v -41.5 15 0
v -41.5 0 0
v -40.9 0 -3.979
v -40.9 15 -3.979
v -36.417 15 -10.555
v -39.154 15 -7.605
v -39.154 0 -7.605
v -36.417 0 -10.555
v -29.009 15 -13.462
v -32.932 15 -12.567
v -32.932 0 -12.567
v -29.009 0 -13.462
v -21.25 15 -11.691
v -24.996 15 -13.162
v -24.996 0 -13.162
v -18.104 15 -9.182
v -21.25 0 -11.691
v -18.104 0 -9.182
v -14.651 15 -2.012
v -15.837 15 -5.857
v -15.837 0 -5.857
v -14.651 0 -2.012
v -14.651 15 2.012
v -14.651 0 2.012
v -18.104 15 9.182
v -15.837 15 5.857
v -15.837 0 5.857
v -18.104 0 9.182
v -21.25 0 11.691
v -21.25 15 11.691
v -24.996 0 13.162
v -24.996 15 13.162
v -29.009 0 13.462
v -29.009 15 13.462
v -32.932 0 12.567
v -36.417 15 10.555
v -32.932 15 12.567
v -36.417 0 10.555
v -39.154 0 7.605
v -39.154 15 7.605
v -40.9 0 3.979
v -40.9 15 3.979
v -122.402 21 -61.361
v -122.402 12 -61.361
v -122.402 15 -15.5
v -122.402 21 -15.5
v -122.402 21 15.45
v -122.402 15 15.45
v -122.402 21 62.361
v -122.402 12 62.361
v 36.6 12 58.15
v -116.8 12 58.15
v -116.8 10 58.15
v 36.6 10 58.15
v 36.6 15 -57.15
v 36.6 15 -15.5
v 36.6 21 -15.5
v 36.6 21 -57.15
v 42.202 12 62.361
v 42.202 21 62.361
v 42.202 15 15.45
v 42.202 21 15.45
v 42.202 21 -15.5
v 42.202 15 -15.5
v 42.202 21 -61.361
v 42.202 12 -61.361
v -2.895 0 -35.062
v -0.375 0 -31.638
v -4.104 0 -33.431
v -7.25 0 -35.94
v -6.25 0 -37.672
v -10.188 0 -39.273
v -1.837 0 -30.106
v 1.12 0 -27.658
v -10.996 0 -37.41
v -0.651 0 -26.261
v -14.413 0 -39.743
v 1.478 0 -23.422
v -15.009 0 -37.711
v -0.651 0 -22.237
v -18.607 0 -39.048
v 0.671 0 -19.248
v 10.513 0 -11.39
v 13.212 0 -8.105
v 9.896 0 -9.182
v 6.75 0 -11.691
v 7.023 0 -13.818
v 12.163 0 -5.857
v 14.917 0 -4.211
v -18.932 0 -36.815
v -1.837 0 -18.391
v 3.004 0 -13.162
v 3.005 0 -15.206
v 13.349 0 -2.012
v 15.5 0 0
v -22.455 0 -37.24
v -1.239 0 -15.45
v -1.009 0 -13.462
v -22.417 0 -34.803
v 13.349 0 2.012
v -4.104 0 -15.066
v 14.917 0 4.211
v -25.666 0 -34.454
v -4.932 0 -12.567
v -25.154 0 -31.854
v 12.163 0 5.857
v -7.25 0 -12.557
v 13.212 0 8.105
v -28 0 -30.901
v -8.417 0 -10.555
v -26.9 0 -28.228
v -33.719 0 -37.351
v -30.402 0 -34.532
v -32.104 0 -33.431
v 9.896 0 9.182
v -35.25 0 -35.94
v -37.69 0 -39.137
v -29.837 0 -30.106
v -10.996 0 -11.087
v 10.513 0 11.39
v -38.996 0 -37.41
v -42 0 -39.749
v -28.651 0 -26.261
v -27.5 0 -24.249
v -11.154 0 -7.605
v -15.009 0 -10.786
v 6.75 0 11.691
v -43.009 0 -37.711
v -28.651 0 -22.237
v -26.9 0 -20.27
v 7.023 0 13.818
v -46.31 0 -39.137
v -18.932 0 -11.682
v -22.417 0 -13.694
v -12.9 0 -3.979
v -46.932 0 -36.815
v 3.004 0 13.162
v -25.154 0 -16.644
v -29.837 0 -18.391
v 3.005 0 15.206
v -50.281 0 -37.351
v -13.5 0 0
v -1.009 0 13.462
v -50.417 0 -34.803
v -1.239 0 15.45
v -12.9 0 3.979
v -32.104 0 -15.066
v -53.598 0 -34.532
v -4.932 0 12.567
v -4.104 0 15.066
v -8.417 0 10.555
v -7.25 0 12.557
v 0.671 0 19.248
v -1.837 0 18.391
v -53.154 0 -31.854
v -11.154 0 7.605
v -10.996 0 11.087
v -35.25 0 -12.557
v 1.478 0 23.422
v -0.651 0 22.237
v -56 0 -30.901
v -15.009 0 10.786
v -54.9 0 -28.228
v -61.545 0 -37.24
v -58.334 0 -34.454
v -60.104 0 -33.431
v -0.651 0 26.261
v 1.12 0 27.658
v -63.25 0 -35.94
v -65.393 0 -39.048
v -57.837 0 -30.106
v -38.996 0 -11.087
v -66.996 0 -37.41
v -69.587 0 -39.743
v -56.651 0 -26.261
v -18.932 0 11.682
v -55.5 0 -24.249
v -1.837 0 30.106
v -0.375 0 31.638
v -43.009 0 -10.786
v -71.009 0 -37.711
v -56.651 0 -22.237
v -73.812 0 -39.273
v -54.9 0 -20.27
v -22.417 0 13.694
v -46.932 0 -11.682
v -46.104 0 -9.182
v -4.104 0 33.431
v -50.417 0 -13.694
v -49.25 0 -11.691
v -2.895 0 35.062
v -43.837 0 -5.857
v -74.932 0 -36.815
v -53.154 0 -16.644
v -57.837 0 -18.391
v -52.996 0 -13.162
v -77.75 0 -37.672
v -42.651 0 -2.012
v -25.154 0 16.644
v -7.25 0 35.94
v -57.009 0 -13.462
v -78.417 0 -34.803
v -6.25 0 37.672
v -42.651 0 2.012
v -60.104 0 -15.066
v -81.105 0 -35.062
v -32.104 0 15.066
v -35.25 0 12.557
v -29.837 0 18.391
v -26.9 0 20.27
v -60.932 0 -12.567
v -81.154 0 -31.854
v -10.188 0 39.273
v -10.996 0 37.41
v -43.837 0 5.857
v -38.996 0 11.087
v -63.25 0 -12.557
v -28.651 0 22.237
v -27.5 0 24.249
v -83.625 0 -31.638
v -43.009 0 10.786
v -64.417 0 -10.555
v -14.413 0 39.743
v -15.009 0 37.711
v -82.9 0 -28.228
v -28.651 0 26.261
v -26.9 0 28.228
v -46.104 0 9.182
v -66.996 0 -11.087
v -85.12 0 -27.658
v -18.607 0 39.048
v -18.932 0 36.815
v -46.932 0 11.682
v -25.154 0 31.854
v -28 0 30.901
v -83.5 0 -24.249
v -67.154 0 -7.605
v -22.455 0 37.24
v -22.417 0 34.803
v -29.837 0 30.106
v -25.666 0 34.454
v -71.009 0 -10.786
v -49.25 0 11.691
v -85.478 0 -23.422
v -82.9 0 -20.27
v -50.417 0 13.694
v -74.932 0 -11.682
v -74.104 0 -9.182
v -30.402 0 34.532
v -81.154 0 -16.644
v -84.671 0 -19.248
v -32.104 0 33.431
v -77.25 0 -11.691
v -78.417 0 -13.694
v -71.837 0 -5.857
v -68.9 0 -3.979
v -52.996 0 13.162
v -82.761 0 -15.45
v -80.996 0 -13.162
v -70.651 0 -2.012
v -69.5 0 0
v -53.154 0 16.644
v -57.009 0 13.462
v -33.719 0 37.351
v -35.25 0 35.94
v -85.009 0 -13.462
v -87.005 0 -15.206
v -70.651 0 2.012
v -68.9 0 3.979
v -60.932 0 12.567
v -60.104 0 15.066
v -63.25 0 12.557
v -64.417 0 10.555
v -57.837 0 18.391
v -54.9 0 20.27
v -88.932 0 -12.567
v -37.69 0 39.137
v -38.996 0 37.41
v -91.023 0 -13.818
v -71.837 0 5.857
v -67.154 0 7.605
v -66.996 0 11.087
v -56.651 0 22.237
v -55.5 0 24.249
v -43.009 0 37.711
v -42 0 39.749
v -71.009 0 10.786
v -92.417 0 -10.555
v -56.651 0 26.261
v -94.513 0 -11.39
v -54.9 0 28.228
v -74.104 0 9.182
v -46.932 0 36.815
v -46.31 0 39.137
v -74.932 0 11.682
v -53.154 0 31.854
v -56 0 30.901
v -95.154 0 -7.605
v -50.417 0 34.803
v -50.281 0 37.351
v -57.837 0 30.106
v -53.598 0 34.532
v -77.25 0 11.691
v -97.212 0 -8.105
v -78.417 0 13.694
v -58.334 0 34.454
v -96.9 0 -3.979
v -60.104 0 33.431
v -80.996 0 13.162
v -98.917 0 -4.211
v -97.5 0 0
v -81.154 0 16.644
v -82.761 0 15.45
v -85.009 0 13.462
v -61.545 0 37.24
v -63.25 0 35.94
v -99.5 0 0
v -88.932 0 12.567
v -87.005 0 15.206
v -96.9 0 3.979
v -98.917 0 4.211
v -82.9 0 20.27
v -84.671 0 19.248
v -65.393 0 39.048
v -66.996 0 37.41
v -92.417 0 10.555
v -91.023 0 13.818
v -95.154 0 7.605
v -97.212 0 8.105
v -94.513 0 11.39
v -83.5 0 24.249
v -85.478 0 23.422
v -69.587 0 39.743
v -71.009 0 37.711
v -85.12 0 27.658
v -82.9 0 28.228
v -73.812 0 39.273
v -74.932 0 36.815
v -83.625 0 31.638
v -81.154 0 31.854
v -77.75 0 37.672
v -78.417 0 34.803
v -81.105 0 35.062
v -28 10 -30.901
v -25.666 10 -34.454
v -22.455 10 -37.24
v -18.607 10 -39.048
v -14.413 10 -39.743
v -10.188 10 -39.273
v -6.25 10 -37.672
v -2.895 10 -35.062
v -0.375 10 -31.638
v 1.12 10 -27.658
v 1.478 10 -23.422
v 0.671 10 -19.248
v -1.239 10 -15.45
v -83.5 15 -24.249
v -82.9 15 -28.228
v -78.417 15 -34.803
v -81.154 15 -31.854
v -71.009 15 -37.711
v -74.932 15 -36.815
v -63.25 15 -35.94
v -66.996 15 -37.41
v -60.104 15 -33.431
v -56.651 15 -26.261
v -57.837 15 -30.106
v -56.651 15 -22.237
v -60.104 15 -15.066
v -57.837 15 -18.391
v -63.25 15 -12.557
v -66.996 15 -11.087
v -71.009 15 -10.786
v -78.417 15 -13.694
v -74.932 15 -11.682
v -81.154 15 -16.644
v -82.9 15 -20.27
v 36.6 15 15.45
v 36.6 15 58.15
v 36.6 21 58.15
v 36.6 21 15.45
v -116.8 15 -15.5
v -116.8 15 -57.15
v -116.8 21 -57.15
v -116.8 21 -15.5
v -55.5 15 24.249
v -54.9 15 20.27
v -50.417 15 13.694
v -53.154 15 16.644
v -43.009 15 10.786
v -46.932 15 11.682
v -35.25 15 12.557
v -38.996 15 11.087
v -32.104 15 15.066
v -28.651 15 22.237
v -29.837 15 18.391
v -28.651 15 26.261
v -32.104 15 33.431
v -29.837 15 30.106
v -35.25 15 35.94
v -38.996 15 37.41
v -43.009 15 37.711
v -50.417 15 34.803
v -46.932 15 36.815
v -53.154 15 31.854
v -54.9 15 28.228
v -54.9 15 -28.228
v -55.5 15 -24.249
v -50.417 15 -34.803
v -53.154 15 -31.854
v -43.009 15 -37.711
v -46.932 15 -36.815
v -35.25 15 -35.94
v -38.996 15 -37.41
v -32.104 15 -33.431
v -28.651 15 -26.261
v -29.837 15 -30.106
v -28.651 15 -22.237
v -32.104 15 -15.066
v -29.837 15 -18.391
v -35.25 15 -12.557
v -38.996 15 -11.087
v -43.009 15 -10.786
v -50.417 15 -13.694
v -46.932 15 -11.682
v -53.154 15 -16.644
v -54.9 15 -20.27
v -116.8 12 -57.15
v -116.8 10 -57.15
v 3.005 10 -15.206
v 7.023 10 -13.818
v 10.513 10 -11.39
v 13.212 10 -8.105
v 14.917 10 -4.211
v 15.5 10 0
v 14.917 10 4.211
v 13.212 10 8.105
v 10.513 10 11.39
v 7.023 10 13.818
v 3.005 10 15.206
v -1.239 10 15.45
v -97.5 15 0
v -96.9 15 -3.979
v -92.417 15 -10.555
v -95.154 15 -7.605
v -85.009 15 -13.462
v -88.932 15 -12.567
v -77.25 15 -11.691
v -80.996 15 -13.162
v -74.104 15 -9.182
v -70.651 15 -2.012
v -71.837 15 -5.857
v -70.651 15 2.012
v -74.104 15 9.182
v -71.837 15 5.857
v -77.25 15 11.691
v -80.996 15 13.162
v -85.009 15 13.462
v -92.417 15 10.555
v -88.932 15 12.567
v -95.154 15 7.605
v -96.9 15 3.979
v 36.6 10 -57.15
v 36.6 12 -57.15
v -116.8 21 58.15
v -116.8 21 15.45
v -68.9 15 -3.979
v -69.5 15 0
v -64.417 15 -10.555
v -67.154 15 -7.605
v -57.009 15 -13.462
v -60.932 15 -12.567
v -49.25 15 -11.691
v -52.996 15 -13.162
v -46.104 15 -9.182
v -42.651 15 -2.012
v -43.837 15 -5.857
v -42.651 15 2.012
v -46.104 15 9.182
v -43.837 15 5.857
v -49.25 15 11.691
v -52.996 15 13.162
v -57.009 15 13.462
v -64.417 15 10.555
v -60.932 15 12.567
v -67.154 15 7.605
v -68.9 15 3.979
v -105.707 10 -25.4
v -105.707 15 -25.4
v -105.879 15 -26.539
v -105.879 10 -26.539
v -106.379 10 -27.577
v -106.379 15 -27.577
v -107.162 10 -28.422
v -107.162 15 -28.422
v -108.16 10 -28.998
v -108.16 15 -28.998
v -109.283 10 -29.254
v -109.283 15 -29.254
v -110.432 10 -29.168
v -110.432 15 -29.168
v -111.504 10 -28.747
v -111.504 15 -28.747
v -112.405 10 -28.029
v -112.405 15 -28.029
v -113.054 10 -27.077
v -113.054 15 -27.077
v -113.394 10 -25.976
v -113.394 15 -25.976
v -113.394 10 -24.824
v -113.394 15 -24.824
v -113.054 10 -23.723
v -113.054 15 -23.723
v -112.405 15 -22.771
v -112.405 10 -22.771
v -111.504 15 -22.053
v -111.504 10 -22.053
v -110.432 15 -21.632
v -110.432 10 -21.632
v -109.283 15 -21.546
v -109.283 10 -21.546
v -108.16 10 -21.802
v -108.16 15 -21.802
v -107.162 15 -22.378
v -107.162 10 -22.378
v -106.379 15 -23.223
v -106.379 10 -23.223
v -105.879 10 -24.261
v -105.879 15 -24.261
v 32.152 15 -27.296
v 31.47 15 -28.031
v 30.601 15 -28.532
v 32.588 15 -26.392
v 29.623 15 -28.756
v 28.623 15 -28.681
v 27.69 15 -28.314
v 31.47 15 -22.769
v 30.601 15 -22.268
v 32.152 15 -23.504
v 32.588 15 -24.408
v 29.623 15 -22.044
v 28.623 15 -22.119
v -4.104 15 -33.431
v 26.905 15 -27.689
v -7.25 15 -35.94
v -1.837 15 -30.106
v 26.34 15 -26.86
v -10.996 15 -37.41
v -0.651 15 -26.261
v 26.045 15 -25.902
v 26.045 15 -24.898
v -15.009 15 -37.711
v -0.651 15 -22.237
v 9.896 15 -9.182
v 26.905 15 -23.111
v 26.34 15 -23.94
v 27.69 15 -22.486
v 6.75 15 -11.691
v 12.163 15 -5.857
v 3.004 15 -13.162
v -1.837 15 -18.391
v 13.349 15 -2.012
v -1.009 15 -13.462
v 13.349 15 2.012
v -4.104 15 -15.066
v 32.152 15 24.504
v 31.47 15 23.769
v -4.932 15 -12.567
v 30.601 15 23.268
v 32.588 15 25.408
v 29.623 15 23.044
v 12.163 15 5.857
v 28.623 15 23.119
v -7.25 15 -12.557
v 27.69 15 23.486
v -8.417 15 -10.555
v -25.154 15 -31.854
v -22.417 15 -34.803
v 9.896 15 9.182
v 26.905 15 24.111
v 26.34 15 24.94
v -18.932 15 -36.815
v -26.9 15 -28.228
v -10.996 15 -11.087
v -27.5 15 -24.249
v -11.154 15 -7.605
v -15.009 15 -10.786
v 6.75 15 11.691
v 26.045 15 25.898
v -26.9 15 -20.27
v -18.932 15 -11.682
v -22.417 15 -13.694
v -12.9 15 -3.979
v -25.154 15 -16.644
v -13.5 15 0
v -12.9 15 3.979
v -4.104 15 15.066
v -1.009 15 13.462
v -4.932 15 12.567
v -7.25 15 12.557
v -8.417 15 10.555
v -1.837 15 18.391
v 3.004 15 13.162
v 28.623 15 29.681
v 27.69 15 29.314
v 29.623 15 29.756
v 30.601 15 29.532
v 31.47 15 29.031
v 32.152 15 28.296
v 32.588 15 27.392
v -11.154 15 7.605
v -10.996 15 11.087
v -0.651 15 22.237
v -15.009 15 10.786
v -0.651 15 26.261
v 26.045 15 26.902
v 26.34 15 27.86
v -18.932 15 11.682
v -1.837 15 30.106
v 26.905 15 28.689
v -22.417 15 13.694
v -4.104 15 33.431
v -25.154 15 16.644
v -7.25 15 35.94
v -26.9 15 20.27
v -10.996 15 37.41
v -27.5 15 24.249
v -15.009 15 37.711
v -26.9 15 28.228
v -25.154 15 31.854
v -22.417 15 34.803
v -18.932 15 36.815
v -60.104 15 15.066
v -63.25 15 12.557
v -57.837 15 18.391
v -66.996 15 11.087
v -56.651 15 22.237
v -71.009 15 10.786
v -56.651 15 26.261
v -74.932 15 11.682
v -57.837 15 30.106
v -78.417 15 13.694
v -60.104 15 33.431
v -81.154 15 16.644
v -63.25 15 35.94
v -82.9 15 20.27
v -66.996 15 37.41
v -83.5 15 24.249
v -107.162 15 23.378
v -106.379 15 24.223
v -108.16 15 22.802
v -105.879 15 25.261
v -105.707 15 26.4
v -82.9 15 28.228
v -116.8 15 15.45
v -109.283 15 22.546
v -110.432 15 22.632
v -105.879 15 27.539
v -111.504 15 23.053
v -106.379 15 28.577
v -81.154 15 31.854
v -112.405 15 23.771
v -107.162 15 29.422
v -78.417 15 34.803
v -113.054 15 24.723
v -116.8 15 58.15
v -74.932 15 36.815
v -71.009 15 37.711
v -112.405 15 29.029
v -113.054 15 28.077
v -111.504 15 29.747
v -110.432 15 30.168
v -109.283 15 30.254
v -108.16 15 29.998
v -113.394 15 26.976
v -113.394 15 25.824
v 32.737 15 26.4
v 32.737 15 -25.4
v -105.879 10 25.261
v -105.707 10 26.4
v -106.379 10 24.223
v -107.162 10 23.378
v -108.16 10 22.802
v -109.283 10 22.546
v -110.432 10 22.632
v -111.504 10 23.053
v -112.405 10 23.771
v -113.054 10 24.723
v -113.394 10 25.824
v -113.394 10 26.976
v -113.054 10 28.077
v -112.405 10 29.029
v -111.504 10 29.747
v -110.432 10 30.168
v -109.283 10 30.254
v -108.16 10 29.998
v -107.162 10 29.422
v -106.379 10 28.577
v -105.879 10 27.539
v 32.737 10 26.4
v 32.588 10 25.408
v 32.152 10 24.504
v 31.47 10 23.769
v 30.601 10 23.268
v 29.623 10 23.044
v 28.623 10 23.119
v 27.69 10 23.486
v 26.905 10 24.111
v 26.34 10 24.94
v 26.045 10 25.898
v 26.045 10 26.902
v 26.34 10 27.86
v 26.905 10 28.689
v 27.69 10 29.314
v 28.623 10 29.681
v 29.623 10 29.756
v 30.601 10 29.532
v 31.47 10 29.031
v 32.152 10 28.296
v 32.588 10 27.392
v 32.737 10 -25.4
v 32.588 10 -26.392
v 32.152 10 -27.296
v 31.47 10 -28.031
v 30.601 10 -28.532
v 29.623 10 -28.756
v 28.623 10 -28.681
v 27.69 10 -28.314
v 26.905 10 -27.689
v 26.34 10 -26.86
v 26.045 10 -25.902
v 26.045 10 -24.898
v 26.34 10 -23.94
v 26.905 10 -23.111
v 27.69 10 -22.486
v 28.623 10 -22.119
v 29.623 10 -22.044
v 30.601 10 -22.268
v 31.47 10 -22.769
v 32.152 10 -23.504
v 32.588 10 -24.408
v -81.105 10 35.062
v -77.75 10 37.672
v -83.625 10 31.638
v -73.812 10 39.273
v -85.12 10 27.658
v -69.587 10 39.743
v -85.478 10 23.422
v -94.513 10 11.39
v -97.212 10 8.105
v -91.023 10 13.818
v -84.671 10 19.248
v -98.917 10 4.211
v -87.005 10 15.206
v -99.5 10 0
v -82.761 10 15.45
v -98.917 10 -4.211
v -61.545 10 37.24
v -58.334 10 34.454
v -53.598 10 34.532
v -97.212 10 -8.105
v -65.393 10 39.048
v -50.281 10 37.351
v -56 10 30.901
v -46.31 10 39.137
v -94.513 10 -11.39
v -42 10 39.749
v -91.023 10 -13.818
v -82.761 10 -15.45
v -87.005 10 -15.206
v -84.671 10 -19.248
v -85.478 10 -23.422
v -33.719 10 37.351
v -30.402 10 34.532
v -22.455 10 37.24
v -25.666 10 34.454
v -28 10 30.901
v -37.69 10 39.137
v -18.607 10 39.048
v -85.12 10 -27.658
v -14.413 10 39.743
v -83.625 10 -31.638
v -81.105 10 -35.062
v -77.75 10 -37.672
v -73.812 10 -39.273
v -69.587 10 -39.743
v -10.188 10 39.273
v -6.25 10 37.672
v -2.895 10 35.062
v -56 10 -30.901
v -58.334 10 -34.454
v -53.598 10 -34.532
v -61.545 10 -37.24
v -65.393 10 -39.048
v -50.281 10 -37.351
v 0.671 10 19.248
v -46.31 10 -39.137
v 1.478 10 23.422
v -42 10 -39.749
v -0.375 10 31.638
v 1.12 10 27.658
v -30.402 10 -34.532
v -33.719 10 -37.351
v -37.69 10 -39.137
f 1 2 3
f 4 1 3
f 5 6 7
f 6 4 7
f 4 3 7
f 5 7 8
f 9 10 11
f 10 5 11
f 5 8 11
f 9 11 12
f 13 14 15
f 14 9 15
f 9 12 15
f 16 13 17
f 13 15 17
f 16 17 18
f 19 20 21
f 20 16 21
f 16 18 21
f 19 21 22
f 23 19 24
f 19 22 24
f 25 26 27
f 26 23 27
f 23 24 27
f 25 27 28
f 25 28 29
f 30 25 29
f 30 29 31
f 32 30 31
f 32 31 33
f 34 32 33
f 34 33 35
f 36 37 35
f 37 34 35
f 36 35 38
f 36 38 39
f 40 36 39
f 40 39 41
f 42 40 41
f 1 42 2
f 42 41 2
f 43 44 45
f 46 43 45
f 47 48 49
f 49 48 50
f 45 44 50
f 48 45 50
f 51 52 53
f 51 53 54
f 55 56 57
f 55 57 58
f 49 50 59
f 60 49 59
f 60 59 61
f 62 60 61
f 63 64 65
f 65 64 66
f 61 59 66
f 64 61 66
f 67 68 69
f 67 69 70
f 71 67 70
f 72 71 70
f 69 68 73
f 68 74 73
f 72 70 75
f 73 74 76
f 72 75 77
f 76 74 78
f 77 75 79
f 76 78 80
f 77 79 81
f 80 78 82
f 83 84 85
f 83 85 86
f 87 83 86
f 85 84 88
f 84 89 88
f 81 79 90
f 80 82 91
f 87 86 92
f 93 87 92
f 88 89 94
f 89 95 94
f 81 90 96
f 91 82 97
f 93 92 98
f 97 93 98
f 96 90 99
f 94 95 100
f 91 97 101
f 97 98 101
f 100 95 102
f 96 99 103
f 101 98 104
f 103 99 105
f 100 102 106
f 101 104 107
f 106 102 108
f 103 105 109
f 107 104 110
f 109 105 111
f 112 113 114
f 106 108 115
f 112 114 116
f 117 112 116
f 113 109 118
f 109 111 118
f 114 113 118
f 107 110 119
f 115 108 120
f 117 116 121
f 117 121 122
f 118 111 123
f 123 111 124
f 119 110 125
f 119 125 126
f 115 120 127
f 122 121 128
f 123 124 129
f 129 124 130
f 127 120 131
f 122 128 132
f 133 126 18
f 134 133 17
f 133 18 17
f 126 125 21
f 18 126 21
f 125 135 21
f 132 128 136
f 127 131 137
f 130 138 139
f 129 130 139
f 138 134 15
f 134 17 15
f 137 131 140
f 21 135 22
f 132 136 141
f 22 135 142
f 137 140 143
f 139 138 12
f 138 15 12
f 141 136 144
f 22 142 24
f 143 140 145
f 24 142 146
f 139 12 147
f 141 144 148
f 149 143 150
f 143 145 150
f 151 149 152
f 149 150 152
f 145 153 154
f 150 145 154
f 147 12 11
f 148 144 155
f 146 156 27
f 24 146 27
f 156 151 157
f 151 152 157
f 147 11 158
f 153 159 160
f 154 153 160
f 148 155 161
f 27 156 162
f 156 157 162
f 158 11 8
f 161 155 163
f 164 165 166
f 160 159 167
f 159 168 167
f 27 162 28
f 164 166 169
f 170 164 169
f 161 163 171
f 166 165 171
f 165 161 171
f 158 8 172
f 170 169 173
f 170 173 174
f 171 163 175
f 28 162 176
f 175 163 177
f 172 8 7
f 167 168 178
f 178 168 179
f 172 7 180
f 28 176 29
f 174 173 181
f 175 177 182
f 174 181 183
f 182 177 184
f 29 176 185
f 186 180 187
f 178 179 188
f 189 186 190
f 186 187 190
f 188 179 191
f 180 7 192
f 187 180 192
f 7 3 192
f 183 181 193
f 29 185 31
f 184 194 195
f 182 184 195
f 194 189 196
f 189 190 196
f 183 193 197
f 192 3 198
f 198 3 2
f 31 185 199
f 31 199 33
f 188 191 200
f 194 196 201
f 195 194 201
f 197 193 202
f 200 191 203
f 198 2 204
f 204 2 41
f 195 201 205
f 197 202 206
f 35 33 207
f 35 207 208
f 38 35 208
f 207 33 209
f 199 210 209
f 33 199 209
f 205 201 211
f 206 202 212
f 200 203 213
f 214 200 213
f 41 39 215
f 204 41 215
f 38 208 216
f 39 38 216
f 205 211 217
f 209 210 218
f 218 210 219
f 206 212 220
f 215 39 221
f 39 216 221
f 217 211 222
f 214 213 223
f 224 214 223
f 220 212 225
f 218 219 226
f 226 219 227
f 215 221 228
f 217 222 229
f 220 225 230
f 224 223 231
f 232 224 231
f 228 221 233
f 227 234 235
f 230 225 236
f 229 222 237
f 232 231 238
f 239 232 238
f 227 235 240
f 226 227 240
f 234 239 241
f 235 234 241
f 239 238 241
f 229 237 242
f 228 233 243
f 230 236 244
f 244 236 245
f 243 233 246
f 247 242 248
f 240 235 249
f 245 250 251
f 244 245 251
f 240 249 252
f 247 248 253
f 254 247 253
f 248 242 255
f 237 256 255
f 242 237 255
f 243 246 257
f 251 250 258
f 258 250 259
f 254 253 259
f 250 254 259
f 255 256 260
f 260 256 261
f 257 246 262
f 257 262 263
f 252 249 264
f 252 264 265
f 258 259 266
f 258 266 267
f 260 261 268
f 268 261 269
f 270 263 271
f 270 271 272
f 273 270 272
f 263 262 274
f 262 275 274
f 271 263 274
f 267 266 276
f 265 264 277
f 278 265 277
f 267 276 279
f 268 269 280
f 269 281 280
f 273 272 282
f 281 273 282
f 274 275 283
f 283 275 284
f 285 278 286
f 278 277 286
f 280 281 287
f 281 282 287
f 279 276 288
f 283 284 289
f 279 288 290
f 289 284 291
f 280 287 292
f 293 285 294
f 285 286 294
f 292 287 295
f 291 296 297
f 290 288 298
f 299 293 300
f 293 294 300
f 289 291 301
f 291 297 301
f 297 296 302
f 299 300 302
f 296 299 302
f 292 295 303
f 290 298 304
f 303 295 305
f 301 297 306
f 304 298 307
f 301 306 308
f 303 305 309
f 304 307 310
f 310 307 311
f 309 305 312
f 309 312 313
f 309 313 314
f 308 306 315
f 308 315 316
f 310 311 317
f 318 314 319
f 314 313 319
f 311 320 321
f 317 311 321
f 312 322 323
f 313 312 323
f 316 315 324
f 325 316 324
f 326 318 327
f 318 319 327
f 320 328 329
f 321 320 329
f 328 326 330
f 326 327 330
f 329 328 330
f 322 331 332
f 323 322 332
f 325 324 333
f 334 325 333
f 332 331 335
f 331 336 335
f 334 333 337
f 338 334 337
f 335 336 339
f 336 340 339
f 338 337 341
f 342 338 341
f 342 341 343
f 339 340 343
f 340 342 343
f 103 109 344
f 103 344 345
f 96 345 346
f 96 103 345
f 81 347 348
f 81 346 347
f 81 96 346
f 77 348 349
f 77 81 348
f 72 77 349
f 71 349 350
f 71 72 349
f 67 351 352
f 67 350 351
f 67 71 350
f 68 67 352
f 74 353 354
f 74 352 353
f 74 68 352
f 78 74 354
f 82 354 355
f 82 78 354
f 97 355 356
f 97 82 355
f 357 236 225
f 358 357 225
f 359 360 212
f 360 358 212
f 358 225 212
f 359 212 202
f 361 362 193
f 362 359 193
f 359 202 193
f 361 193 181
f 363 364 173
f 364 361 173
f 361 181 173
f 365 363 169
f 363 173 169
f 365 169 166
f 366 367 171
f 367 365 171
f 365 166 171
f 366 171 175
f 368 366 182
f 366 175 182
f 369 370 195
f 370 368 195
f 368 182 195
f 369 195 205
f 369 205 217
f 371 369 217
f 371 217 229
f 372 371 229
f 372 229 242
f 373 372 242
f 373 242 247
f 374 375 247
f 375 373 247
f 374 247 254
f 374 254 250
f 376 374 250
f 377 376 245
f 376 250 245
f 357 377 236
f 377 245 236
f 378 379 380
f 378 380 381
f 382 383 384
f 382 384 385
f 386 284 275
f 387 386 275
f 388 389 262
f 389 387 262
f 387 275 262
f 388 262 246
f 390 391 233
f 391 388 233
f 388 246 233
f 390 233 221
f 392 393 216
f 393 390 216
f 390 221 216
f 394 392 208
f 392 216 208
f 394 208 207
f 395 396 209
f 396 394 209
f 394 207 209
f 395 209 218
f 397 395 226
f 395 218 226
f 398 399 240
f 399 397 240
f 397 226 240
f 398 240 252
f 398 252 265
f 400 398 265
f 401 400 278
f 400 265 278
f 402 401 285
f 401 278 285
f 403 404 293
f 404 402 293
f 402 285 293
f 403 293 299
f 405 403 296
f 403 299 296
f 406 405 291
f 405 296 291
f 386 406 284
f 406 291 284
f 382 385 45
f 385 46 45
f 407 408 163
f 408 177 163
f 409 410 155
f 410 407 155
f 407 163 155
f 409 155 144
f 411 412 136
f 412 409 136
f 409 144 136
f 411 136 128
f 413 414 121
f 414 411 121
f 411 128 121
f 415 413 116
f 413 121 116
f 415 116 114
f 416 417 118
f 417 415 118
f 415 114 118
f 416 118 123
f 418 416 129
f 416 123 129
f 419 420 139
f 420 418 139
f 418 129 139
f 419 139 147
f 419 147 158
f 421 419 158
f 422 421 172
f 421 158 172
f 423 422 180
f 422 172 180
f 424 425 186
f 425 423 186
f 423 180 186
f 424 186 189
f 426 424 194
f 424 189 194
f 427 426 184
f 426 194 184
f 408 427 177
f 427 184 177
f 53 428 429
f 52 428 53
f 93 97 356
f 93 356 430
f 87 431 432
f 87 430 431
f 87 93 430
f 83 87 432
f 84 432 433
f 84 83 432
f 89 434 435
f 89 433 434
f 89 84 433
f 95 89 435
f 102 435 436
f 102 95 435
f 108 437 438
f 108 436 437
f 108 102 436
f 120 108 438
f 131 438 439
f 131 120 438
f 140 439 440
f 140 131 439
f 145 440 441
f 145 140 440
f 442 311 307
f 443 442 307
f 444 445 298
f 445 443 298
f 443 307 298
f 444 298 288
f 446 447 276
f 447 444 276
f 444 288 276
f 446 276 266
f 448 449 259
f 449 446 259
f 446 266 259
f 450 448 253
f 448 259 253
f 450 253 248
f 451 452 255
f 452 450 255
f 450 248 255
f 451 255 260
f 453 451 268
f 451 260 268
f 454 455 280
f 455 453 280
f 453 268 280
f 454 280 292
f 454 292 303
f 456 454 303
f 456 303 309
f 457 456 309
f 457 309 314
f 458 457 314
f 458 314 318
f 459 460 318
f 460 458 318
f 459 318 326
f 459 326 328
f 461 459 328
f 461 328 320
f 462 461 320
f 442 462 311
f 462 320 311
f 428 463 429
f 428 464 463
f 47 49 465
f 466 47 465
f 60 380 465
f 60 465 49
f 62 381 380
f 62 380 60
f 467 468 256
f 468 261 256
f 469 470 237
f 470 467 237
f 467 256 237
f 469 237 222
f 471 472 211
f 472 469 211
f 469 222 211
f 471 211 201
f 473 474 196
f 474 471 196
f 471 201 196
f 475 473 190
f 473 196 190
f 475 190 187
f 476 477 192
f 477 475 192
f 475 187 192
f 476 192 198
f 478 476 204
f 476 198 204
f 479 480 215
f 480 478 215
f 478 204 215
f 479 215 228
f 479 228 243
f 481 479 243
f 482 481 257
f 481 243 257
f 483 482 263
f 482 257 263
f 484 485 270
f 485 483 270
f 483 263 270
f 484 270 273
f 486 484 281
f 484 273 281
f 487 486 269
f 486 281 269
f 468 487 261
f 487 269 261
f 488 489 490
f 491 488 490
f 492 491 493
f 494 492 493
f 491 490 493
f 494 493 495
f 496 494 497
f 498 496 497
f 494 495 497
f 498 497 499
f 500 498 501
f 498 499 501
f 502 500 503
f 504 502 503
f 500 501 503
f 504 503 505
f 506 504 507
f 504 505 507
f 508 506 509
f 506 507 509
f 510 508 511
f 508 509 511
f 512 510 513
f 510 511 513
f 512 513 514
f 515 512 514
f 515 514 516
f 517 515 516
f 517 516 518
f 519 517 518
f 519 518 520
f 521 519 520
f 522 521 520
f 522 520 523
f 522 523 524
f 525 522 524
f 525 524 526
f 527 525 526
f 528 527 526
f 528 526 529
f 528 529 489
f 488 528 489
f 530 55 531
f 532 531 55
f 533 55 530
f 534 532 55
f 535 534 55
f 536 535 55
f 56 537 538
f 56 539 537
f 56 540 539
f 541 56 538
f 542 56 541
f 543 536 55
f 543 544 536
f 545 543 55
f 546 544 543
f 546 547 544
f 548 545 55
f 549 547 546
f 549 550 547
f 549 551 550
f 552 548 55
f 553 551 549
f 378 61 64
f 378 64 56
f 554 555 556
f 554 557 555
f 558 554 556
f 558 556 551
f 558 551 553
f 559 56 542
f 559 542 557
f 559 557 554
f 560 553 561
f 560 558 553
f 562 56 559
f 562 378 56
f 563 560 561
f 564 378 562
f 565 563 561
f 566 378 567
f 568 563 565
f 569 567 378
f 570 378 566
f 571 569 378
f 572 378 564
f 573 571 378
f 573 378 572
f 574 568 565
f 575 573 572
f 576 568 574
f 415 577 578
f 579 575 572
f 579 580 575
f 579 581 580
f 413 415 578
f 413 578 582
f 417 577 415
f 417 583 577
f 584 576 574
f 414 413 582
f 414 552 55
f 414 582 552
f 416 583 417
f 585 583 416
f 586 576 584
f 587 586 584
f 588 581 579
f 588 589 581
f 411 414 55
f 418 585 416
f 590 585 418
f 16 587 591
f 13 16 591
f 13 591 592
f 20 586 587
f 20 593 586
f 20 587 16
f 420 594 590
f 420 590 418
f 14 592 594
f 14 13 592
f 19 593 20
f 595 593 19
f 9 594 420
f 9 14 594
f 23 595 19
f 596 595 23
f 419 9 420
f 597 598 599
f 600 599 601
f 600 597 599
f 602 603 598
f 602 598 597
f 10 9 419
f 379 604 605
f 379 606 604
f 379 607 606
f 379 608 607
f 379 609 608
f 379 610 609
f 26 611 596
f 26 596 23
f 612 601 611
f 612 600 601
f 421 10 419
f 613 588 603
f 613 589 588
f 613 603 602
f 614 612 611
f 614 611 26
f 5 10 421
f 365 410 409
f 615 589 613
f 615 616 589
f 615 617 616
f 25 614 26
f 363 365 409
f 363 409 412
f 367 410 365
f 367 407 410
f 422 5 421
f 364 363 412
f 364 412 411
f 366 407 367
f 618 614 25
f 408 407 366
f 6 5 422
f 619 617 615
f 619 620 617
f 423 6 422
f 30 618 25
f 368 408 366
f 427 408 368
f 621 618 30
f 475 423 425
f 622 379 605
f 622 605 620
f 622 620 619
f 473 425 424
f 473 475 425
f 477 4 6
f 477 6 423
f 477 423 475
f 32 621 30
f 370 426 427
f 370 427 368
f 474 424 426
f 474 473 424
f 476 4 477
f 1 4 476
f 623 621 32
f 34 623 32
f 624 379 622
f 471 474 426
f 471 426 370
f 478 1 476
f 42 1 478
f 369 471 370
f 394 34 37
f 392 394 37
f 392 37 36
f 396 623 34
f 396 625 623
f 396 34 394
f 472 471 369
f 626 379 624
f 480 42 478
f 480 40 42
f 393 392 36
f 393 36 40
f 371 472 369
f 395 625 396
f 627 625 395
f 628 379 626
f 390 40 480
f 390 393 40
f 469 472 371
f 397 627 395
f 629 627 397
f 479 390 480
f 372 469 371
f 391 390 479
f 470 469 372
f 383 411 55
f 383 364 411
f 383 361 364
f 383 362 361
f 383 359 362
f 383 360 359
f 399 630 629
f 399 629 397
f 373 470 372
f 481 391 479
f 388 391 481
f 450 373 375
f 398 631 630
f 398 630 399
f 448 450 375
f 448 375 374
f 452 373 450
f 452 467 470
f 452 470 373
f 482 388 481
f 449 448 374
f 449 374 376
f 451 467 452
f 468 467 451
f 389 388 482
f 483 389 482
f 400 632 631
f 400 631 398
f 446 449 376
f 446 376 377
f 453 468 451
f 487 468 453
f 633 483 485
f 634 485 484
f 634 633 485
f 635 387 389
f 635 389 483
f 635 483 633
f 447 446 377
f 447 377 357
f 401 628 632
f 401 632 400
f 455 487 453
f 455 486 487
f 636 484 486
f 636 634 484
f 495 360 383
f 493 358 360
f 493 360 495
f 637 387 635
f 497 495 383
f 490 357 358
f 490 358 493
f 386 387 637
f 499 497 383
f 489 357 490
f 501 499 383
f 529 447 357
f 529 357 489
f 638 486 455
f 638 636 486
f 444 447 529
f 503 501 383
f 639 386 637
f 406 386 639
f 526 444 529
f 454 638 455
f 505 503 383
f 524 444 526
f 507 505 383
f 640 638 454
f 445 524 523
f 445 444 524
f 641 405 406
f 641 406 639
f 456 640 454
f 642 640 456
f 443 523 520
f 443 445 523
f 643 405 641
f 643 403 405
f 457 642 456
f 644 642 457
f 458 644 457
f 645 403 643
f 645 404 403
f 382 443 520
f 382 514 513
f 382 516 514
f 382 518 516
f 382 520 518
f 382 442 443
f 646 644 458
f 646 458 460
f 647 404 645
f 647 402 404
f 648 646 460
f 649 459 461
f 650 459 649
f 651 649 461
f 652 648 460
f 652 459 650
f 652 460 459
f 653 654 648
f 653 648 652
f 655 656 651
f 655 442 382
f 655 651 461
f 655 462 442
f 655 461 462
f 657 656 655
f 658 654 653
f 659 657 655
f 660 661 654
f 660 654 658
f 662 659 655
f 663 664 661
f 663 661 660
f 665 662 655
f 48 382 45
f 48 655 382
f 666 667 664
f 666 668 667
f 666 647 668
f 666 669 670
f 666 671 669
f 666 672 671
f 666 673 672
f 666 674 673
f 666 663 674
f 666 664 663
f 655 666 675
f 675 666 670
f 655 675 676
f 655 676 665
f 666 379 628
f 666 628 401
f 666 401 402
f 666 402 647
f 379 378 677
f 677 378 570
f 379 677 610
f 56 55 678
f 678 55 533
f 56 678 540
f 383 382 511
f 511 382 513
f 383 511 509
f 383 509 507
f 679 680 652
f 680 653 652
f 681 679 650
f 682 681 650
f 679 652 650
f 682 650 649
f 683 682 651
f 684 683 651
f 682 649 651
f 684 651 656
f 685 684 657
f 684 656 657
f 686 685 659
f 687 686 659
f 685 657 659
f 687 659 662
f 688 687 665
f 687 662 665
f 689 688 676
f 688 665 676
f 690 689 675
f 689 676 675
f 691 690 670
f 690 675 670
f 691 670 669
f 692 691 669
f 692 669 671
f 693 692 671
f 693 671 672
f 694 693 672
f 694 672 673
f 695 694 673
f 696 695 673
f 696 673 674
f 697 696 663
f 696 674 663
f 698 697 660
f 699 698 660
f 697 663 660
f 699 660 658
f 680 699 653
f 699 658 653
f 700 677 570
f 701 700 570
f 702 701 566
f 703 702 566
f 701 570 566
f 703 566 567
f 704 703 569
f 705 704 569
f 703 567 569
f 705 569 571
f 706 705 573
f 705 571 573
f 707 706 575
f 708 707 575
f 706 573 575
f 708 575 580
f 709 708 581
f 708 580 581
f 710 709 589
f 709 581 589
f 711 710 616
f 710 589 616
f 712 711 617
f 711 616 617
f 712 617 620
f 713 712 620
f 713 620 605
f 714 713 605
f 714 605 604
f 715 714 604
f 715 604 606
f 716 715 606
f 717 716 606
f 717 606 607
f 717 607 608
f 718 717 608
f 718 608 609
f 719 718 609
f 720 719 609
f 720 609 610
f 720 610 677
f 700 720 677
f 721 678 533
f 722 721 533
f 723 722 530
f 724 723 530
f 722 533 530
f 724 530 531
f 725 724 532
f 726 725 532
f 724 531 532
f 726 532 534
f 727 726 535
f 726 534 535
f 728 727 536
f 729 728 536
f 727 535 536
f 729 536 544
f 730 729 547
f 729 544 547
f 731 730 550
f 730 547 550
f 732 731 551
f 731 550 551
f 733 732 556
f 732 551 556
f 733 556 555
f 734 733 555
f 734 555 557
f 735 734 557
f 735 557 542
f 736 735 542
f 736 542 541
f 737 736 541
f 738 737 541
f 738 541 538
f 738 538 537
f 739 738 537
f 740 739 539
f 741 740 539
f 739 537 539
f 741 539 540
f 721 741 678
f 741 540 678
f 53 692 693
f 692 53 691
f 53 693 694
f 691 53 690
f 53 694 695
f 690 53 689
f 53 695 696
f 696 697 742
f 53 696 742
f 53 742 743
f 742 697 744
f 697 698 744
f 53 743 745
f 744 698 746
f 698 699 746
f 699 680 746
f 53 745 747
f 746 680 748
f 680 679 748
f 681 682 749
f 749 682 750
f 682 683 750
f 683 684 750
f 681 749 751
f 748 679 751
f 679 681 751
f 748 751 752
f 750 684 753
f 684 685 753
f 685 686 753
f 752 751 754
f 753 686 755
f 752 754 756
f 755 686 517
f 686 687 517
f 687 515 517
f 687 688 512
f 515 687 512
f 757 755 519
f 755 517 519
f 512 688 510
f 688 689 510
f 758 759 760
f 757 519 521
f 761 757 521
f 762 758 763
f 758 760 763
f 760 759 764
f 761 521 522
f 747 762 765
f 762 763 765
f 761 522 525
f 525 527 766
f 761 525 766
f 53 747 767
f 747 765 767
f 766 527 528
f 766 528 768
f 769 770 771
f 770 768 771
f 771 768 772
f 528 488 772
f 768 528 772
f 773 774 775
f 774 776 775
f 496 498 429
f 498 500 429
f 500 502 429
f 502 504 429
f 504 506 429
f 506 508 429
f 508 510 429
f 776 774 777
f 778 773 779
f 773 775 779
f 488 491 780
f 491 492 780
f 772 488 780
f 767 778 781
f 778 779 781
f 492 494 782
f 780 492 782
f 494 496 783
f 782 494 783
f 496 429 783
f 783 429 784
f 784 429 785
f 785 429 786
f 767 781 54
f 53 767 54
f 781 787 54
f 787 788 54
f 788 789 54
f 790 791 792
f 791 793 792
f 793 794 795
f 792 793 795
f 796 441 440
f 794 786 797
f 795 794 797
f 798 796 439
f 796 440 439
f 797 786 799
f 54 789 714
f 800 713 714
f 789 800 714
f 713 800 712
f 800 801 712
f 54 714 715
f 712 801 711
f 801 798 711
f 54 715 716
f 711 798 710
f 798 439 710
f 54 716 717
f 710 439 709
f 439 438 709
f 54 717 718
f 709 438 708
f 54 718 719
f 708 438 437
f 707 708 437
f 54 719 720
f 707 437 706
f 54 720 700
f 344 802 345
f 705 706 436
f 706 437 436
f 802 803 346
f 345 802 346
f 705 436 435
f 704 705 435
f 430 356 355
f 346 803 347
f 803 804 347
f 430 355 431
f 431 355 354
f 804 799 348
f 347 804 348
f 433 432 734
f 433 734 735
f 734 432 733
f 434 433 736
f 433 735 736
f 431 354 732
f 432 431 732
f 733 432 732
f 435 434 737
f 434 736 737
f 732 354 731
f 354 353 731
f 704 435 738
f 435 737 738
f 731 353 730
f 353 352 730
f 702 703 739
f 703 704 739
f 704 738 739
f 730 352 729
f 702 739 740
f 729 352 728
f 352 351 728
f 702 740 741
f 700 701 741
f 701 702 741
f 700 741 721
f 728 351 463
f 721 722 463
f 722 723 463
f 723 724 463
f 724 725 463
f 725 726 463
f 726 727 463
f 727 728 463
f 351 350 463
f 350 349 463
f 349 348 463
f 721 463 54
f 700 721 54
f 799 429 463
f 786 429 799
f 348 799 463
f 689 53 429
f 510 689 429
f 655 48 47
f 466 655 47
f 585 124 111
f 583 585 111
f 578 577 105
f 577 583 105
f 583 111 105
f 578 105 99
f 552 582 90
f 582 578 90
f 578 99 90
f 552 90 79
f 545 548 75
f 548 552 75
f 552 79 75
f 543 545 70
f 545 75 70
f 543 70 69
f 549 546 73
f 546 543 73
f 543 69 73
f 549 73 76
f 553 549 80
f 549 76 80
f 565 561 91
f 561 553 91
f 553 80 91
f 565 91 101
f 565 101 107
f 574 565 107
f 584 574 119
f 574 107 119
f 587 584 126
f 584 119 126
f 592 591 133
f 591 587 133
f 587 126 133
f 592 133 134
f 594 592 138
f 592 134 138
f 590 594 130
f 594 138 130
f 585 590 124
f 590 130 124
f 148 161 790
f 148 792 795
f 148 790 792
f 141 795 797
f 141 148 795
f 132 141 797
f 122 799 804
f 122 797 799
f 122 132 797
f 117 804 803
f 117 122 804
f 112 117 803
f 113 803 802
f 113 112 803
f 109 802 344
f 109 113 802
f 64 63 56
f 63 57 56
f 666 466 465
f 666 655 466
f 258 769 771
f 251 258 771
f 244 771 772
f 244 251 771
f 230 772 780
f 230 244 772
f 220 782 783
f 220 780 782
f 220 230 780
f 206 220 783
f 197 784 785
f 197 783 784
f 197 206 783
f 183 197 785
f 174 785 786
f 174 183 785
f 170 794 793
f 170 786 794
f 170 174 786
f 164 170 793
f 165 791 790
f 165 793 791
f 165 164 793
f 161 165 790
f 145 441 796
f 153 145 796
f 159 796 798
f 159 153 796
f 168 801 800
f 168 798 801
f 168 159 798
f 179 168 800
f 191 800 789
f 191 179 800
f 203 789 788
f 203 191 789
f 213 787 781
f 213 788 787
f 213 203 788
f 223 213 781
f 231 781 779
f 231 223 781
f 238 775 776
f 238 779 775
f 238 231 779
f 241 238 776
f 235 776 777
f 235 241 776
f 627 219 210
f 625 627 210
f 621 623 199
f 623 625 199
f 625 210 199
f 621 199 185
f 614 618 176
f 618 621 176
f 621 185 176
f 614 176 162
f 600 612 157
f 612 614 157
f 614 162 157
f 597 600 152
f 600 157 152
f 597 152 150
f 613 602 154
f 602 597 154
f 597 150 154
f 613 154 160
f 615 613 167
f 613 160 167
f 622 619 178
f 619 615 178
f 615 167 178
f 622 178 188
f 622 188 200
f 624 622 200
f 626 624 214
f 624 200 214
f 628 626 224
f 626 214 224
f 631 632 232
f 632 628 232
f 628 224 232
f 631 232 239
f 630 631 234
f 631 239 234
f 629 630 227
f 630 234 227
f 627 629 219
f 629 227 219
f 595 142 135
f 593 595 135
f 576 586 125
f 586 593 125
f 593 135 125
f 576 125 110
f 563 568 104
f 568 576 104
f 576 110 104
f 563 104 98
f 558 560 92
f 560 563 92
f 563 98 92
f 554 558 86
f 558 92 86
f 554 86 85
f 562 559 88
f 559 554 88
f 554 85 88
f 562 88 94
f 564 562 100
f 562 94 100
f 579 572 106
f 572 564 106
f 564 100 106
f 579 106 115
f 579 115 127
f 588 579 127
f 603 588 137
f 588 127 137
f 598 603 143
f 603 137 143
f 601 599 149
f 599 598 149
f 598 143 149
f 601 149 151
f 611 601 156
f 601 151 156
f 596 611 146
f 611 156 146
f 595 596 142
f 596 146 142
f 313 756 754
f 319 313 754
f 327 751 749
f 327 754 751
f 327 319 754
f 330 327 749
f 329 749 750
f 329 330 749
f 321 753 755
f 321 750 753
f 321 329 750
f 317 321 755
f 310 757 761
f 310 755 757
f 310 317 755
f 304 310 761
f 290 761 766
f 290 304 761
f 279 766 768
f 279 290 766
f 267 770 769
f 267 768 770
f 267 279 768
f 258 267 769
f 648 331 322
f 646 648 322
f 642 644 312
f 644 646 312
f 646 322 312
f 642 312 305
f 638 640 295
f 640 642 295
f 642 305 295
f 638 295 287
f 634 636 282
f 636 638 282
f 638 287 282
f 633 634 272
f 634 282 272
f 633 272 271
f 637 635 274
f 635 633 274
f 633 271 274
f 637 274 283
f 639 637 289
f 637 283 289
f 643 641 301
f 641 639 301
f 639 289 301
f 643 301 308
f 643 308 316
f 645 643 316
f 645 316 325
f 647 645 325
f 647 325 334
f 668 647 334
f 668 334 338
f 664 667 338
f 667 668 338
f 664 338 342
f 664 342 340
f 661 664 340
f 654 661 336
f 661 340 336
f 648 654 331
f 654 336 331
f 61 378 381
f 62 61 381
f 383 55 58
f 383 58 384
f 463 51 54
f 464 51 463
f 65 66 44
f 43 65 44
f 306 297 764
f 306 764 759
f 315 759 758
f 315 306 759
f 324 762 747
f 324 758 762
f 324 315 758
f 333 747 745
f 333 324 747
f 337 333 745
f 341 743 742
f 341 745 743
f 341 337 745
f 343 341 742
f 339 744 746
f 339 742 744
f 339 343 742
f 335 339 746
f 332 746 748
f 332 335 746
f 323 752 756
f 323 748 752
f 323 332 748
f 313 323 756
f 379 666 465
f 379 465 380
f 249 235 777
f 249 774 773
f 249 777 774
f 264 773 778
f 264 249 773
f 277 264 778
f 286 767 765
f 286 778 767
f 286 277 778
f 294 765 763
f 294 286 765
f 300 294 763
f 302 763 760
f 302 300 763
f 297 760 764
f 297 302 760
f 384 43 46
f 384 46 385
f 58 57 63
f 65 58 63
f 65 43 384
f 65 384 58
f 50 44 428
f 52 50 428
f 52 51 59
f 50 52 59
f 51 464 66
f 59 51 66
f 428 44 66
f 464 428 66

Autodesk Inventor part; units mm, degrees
ref_plane "YZ Plane" through (0, 0, 0) normal (1, 0, 0) x (0, 1, 0)
ref_plane "XZ Plane" through (0, 0, 0) normal (0, 1, 0) x (-1, 0, 0)
ref_plane "XY Plane" through (0, 0, 0) normal (0, 0, 1) x (1, 0, 0)
sketch "Sketch1" plane through (0, 0, 0) normal (0, 1, 0) x (-1, 0, 0)
  circle A0 centre (0, 0) radius 13.5
  circle A1 centre (0, 0) radius 14.5 construction
  circle A2 centre (28, 0) radius 13.5
  circle A3 centre (28, 0) radius 14.5 construction
  circle A4 centre (56, 0) radius 13.5
  circle A5 centre (56, 0) radius 14.5 construction
  circle A6 centre (84, 0) radius 13.5
  circle A7 centre (84, 0) radius 14.5 construction
  circle A8 centre (14, 24.2487) radius 13.5
  circle A9 centre (42, 24.2487) radius 13.5
  circle A10 centre (70, 24.2487) radius 13.5
  circle A11 centre (70, -24.2487) radius 13.5
  circle A12 centre (42, -24.2487) radius 13.5
  circle A13 centre (14, -24.2487) radius 13.5
  line L0 (84, 0) -> (56, 0) construction
  circle A14 centre (14, 24.2487) radius 14.5 construction
  circle A15 centre (42, 24.2487) radius 14.5 construction
  circle A16 centre (70, 24.2487) radius 14.5 construction
  circle A17 centre (70, -24.2487) radius 14.5 construction
  circle A18 centre (42, -24.2487) radius 14.5 construction
  circle A19 centre (14, -24.2487) radius 14.5 construction
  circle A20 centre (0, 0) radius 15.5 construction
  circle A21 centre (14, 24.2487) radius 15.5 construction
  circle A22 centre (42, 24.2487) radius 15.5 construction
  circle A23 centre (70, 24.2487) radius 15.5 construction
  circle A24 centre (70, -24.2487) radius 15.5 construction
  circle A25 centre (42, -24.2487) radius 15.5 construction
  circle A26 centre (14, -24.2487) radius 15.5 construction
  arc A27 (1.2391, 15.4504) -> (1.2391, -15.4504) centre (0, 0) ccw
  arc A28 (28, 30.9008) -> (1.2391, 15.4504) centre (14, 24.2487) ccw
  arc A29 (56, 30.9008) -> (28, 30.9008) centre (42, 24.2487) ccw
  line L1 (70, 24.2487) -> (14, 24.2487) construction
  line L2 (14, 24.2487) -> (14, -24.2487) construction
  line L3 (14, -24.2487) -> (70, -24.2487) construction
  line L4 (70, -24.2487) -> (70, 24.2487) construction
  circle A30 centre (84, 0) radius 15.5 construction
  arc A31 (82.7609, 15.4504) -> (56, 30.9008) centre (70, 24.2487) ccw
  arc A32 (82.7609, -15.4504) -> (82.7609, 15.4504) centre (84, 0) ccw
  arc A33 (56, -30.9008) -> (82.7609, -15.4504) centre (70, -24.2487) ccw
  arc A34 (28, -30.9008) -> (56, -30.9008) centre (42, -24.2487) ccw
  arc A35 (1.2391, -15.4504) -> (28, -30.9008) centre (14, -24.2487) ccw
  dimension "d0" = 27
  dimension "d1" = 29
  dimension "d2" = 27
  dimension "d3" = 29
  dimension "d4" = 27
  dimension "d5" = 29
  dimension "d6" = 27
  dimension "d7" = 29
  dimension "d8" = 27
  dimension "d9" = 27
  dimension "d10" = 27
  dimension "d11" = 27
  dimension "d12" = 27
  dimension "d13" = 27
  dimension "d14" = 29
  dimension "d15" = 29
  dimension "d16" = 29
  dimension "d17" = 29
  dimension "d18" = 29
  dimension "d19" = 29
  dimension "d20" = 31
  dimension "d21" = 31
  dimension "d22" = 31
  dimension "d23" = 31
  dimension "d24" = 31
  dimension "d25" = 31
  dimension "d26" = 31
  dimension "d27" = 31
extrude "Extrusion1" add sketch "Sketch1" along normal blind 15
sketch "Sketch2" plane through (0, 15, 0) normal (0, 1, 0) x (1, 0, 0)
  arc A0 (-1.2391, 15.4504) -> (-28, 30.9008) centre (-14, 24.2487) ccw projected
  arc A1 (-28, 30.9008) -> (-56, 30.9008) centre (-42, 24.2487) ccw projected
  arc A2 (-56, 30.9008) -> (-82.7609, 15.4504) centre (-70, 24.2487) ccw projected
  arc A3 (-82.7609, 15.4504) -> (-82.7609, -15.4504) centre (-84, 0) ccw projected
  arc A4 (-82.7609, -15.4504) -> (-56, -30.9008) centre (-70, -24.2487) ccw projected
  arc A5 (-56, -30.9008) -> (-28, -30.9008) centre (-42, -24.2487) ccw projected
  arc A6 (-28, -30.9008) -> (-1.2391, -15.4504) centre (-14, -24.2487) ccw projected
  arc A7 (-1.2391, -15.4504) -> (-1.2391, 15.4504) centre (0, 0) ccw projected
  circle A8 centre (-14, 24.2487) radius 13.5 projected
  circle A9 centre (-42, 24.2487) radius 13.5 projected
  circle A10 centre (-70, 24.2487) radius 13.5 projected
  circle A11 centre (-70, -24.2487) radius 13.5 projected
  circle A12 centre (-42, -24.2487) radius 13.5 projected
  circle A13 centre (-14, -24.2487) radius 13.5 projected
  circle A14 centre (-84, 0) radius 13.5 projected
  circle A15 centre (-56, 0) radius 13.5 projected
  circle A16 centre (-28, 0) radius 13.5 projected
  circle A17 centre (0, 0) radius 13.5 projected
  line L0 (-116.8, -58.15) -> (36.6, -58.15)
  line L1 (36.6, -58.15) -> (36.6, 57.15)
  line L2 (36.6, 57.15) -> (-116.8, 57.15)
  line L3 (-116.8, 57.15) -> (-116.8, -58.15)
  line L4 (-116.8, -58.15) -> (36.6, 57.15) construction
  line L5 (36.6, -58.15) -> (-116.8, 57.15) construction
  arc A18 (-82.7609, 15.4504) -> (-82.7609, -15.4504) centre (-84, 0) ccw
  arc A19 (-56, 30.9008) -> (-82.7609, 15.4504) centre (-70, 24.2487) ccw
  arc A20 (-28, 30.9008) -> (-56, 30.9008) centre (-42, 24.2487) ccw
  arc A21 (-1.2391, 15.4504) -> (-28, 30.9008) centre (-14, 24.2487) ccw
  arc A22 (-1.2391, -15.4504) -> (-1.2391, 15.4504) centre (0, 0) ccw
  arc A23 (-28, -30.9008) -> (-1.2391, -15.4504) centre (-14, -24.2487) ccw
  arc A24 (-56, -30.9008) -> (-28, -30.9008) centre (-42, -24.2487) ccw
  arc A25 (-82.7609, -15.4504) -> (-56, -30.9008) centre (-70, -24.2487) ccw
  point P0 (-40.1, -0.5)
  dimension "d30" = 153.4
  dimension "d31" = 115.3
extrude "Extrusion2" add sketch "Sketch2" against normal blind 5 contours L3 L2 L1 L0
sketch "Sketch3" plane through (0, 15, 0) normal (0, 1, 0) x (1, 0, 0)
  line L0 (36.6, -58.15) -> (36.6, 57.15) projected
  line L1 (36.6, 57.15) -> (-116.8, 57.15) projected
  line L2 (-116.8, 57.15) -> (-116.8, -58.15) projected
  line L3 (-116.8, -58.15) -> (36.6, -58.15) projected
  circle A0 centre (-14, 24.2487) radius 13.5 projected
  circle A1 centre (-42, 24.2487) radius 13.5 projected
  circle A2 centre (-70, 24.2487) radius 13.5 projected
  circle A3 centre (-70, -24.2487) radius 13.5 projected
  circle A4 centre (-42, -24.2487) radius 13.5 projected
  circle A5 centre (-14, -24.2487) radius 13.5 projected
  circle A6 centre (-84, 0) radius 13.5 projected
  circle A7 centre (-56, 0) radius 13.5 projected
  circle A8 centre (-28, 0) radius 13.5 projected
  circle A9 centre (0, 0) radius 13.5 projected
  line L4 (-122.402, -62.3606) -> (42.202, -62.3606)
  line L5 (42.202, -62.3606) -> (42.202, 61.3606)
  line L6 (42.202, 61.3606) -> (-122.402, 61.3606)
  line L7 (-122.402, 61.3606) -> (-122.402, -62.3606)
  line L8 (-122.402, -62.3606) -> (42.202, 61.3606) construction
  line L9 (42.202, -62.3606) -> (-122.402, 61.3606) construction
  line L10 (-116.8, -58.15) -> (36.6, -58.15)
  line L11 (36.6, -58.15) -> (36.6, 57.15)
  line L12 (36.6, 57.15) -> (-116.8, 57.15)
  line L13 (-116.8, 57.15) -> (-116.8, -58.15)
  line L14 (-116.8, -58.15) -> (36.6, 57.15) construction
  line L15 (36.6, -58.15) -> (-116.8, 57.15) construction
  point P0 (-40.1, -0.5)
extrude "Extrusion3" add sketch "Sketch3" along normal blind 6 and the other way blind 3 contours L7 L6 L5 L4
sketch "Sketch4" plane through (0, 15, 0) normal (0, 1, 0) x (1, 0, 0)
  line L0 (36.6, -58.15) -> (36.6, 57.15) construction
  line L1 (36.6, 57.15) -> (-116.8, 57.15) construction
  line L2 (-116.8, 57.15) -> (-116.8, -58.15) construction
  line L3 (-116.8, -58.15) -> (36.6, -58.15) construction
  circle A0 centre (-14, 24.2487) radius 13.5 construction
  circle A1 centre (-42, 24.2487) radius 13.5 construction
  circle A2 centre (-70, 24.2487) radius 13.5 construction
  circle A3 centre (-70, -24.2487) radius 13.5 construction
  circle A4 centre (-42, -24.2487) radius 13.5 construction
  circle A5 centre (-14, -24.2487) radius 13.5 construction
  circle A6 centre (-84, 0) radius 13.5 construction
  circle A7 centre (-56, 0) radius 13.5 construction
  circle A8 centre (-28, 0) radius 13.5 construction
  circle A9 centre (0, 0) radius 13.5 construction
  line L4 (-116.8, 57.15) -> (-109.572, 57.15) construction
  line L5 (-109.572, 57.15) -> (-109.572, 25.4) construction
  line L6 (-109.572, 25.4) -> (-116.8, 25.4) construction
  line L7 (-116.8, 25.4) -> (-116.8, 57.15) construction
  line L8 (36.6, 57.15) -> (29.372, 57.15) construction
  line L9 (29.372, 57.15) -> (29.372, 25.4) construction
  line L10 (29.372, 25.4) -> (36.6, 25.4) construction
  line L11 (36.6, 25.4) -> (36.6, 57.15) construction
  line L12 (36.6, -58.15) -> (29.372, -58.15) construction
  line L13 (29.372, -58.15) -> (29.372, -26.4) construction
  line L14 (29.372, -26.4) -> (36.6, -26.4) construction
  line L15 (36.6, -26.4) -> (36.6, -58.15) construction
  line L16 (-116.8, -58.15) -> (-109.572, -58.15) construction
  line L17 (-109.572, -58.15) -> (-109.572, -26.4) construction
  line L18 (-109.572, -26.4) -> (-116.8, -26.4) construction
  line L19 (-116.8, -26.4) -> (-116.8, -58.15) construction
  circle A10 centre (-109.572, 25.4) radius 3.865
  circle A11 centre (29.372, 25.4) radius 3.365
  circle A12 centre (29.372, -26.4) radius 3.365
  circle A13 centre (-109.572, -26.4) radius 3.865
  dimension "d42" = 31.75
  dimension "d43" = 7.228
  dimension "d44" = 31.75
  dimension "d45" = 7.228
  dimension "d46" = 7.228
  dimension "d47" = 31.75
  dimension "d48" = 31.75
  dimension "d49" = 7.228
  dimension "d50" = 7.73
  dimension "d51" = 6.73
  dimension "d52" = 6.73
  dimension "d55" = 7.73
extrude "Extrusion4" cut sketch "Sketch4" against normal through all
sketch "Sketch5" plane through (-122.402, 12, 62.3606) normal (-1, 0, 0) x (0, 0, 1)
  line L0 (-77.8606, -12) -> (-77.8606, -2) projected
  line L1 (-46.9102, -12) -> (-46.9102, -2) projected
  line L2 (-119.5106, 3) -> (-4.2106, 3) projected
  line L3 (-123.7212, 9) -> (0, 9) projected
  line L4 (-77.8606, 3) -> (-46.9102, 3)
  line L5 (-46.9102, 3) -> (-46.9102, 9)
  line L6 (-46.9102, 9) -> (-77.8606, 9)
  line L7 (-77.8606, 9) -> (-77.8606, 3)
  point P0 (-62.3606, -12)
extrude "Extrusion5" cut sketch "Sketch5" against normal through all
properties part number "CELLCASE26650_3DPrint"
